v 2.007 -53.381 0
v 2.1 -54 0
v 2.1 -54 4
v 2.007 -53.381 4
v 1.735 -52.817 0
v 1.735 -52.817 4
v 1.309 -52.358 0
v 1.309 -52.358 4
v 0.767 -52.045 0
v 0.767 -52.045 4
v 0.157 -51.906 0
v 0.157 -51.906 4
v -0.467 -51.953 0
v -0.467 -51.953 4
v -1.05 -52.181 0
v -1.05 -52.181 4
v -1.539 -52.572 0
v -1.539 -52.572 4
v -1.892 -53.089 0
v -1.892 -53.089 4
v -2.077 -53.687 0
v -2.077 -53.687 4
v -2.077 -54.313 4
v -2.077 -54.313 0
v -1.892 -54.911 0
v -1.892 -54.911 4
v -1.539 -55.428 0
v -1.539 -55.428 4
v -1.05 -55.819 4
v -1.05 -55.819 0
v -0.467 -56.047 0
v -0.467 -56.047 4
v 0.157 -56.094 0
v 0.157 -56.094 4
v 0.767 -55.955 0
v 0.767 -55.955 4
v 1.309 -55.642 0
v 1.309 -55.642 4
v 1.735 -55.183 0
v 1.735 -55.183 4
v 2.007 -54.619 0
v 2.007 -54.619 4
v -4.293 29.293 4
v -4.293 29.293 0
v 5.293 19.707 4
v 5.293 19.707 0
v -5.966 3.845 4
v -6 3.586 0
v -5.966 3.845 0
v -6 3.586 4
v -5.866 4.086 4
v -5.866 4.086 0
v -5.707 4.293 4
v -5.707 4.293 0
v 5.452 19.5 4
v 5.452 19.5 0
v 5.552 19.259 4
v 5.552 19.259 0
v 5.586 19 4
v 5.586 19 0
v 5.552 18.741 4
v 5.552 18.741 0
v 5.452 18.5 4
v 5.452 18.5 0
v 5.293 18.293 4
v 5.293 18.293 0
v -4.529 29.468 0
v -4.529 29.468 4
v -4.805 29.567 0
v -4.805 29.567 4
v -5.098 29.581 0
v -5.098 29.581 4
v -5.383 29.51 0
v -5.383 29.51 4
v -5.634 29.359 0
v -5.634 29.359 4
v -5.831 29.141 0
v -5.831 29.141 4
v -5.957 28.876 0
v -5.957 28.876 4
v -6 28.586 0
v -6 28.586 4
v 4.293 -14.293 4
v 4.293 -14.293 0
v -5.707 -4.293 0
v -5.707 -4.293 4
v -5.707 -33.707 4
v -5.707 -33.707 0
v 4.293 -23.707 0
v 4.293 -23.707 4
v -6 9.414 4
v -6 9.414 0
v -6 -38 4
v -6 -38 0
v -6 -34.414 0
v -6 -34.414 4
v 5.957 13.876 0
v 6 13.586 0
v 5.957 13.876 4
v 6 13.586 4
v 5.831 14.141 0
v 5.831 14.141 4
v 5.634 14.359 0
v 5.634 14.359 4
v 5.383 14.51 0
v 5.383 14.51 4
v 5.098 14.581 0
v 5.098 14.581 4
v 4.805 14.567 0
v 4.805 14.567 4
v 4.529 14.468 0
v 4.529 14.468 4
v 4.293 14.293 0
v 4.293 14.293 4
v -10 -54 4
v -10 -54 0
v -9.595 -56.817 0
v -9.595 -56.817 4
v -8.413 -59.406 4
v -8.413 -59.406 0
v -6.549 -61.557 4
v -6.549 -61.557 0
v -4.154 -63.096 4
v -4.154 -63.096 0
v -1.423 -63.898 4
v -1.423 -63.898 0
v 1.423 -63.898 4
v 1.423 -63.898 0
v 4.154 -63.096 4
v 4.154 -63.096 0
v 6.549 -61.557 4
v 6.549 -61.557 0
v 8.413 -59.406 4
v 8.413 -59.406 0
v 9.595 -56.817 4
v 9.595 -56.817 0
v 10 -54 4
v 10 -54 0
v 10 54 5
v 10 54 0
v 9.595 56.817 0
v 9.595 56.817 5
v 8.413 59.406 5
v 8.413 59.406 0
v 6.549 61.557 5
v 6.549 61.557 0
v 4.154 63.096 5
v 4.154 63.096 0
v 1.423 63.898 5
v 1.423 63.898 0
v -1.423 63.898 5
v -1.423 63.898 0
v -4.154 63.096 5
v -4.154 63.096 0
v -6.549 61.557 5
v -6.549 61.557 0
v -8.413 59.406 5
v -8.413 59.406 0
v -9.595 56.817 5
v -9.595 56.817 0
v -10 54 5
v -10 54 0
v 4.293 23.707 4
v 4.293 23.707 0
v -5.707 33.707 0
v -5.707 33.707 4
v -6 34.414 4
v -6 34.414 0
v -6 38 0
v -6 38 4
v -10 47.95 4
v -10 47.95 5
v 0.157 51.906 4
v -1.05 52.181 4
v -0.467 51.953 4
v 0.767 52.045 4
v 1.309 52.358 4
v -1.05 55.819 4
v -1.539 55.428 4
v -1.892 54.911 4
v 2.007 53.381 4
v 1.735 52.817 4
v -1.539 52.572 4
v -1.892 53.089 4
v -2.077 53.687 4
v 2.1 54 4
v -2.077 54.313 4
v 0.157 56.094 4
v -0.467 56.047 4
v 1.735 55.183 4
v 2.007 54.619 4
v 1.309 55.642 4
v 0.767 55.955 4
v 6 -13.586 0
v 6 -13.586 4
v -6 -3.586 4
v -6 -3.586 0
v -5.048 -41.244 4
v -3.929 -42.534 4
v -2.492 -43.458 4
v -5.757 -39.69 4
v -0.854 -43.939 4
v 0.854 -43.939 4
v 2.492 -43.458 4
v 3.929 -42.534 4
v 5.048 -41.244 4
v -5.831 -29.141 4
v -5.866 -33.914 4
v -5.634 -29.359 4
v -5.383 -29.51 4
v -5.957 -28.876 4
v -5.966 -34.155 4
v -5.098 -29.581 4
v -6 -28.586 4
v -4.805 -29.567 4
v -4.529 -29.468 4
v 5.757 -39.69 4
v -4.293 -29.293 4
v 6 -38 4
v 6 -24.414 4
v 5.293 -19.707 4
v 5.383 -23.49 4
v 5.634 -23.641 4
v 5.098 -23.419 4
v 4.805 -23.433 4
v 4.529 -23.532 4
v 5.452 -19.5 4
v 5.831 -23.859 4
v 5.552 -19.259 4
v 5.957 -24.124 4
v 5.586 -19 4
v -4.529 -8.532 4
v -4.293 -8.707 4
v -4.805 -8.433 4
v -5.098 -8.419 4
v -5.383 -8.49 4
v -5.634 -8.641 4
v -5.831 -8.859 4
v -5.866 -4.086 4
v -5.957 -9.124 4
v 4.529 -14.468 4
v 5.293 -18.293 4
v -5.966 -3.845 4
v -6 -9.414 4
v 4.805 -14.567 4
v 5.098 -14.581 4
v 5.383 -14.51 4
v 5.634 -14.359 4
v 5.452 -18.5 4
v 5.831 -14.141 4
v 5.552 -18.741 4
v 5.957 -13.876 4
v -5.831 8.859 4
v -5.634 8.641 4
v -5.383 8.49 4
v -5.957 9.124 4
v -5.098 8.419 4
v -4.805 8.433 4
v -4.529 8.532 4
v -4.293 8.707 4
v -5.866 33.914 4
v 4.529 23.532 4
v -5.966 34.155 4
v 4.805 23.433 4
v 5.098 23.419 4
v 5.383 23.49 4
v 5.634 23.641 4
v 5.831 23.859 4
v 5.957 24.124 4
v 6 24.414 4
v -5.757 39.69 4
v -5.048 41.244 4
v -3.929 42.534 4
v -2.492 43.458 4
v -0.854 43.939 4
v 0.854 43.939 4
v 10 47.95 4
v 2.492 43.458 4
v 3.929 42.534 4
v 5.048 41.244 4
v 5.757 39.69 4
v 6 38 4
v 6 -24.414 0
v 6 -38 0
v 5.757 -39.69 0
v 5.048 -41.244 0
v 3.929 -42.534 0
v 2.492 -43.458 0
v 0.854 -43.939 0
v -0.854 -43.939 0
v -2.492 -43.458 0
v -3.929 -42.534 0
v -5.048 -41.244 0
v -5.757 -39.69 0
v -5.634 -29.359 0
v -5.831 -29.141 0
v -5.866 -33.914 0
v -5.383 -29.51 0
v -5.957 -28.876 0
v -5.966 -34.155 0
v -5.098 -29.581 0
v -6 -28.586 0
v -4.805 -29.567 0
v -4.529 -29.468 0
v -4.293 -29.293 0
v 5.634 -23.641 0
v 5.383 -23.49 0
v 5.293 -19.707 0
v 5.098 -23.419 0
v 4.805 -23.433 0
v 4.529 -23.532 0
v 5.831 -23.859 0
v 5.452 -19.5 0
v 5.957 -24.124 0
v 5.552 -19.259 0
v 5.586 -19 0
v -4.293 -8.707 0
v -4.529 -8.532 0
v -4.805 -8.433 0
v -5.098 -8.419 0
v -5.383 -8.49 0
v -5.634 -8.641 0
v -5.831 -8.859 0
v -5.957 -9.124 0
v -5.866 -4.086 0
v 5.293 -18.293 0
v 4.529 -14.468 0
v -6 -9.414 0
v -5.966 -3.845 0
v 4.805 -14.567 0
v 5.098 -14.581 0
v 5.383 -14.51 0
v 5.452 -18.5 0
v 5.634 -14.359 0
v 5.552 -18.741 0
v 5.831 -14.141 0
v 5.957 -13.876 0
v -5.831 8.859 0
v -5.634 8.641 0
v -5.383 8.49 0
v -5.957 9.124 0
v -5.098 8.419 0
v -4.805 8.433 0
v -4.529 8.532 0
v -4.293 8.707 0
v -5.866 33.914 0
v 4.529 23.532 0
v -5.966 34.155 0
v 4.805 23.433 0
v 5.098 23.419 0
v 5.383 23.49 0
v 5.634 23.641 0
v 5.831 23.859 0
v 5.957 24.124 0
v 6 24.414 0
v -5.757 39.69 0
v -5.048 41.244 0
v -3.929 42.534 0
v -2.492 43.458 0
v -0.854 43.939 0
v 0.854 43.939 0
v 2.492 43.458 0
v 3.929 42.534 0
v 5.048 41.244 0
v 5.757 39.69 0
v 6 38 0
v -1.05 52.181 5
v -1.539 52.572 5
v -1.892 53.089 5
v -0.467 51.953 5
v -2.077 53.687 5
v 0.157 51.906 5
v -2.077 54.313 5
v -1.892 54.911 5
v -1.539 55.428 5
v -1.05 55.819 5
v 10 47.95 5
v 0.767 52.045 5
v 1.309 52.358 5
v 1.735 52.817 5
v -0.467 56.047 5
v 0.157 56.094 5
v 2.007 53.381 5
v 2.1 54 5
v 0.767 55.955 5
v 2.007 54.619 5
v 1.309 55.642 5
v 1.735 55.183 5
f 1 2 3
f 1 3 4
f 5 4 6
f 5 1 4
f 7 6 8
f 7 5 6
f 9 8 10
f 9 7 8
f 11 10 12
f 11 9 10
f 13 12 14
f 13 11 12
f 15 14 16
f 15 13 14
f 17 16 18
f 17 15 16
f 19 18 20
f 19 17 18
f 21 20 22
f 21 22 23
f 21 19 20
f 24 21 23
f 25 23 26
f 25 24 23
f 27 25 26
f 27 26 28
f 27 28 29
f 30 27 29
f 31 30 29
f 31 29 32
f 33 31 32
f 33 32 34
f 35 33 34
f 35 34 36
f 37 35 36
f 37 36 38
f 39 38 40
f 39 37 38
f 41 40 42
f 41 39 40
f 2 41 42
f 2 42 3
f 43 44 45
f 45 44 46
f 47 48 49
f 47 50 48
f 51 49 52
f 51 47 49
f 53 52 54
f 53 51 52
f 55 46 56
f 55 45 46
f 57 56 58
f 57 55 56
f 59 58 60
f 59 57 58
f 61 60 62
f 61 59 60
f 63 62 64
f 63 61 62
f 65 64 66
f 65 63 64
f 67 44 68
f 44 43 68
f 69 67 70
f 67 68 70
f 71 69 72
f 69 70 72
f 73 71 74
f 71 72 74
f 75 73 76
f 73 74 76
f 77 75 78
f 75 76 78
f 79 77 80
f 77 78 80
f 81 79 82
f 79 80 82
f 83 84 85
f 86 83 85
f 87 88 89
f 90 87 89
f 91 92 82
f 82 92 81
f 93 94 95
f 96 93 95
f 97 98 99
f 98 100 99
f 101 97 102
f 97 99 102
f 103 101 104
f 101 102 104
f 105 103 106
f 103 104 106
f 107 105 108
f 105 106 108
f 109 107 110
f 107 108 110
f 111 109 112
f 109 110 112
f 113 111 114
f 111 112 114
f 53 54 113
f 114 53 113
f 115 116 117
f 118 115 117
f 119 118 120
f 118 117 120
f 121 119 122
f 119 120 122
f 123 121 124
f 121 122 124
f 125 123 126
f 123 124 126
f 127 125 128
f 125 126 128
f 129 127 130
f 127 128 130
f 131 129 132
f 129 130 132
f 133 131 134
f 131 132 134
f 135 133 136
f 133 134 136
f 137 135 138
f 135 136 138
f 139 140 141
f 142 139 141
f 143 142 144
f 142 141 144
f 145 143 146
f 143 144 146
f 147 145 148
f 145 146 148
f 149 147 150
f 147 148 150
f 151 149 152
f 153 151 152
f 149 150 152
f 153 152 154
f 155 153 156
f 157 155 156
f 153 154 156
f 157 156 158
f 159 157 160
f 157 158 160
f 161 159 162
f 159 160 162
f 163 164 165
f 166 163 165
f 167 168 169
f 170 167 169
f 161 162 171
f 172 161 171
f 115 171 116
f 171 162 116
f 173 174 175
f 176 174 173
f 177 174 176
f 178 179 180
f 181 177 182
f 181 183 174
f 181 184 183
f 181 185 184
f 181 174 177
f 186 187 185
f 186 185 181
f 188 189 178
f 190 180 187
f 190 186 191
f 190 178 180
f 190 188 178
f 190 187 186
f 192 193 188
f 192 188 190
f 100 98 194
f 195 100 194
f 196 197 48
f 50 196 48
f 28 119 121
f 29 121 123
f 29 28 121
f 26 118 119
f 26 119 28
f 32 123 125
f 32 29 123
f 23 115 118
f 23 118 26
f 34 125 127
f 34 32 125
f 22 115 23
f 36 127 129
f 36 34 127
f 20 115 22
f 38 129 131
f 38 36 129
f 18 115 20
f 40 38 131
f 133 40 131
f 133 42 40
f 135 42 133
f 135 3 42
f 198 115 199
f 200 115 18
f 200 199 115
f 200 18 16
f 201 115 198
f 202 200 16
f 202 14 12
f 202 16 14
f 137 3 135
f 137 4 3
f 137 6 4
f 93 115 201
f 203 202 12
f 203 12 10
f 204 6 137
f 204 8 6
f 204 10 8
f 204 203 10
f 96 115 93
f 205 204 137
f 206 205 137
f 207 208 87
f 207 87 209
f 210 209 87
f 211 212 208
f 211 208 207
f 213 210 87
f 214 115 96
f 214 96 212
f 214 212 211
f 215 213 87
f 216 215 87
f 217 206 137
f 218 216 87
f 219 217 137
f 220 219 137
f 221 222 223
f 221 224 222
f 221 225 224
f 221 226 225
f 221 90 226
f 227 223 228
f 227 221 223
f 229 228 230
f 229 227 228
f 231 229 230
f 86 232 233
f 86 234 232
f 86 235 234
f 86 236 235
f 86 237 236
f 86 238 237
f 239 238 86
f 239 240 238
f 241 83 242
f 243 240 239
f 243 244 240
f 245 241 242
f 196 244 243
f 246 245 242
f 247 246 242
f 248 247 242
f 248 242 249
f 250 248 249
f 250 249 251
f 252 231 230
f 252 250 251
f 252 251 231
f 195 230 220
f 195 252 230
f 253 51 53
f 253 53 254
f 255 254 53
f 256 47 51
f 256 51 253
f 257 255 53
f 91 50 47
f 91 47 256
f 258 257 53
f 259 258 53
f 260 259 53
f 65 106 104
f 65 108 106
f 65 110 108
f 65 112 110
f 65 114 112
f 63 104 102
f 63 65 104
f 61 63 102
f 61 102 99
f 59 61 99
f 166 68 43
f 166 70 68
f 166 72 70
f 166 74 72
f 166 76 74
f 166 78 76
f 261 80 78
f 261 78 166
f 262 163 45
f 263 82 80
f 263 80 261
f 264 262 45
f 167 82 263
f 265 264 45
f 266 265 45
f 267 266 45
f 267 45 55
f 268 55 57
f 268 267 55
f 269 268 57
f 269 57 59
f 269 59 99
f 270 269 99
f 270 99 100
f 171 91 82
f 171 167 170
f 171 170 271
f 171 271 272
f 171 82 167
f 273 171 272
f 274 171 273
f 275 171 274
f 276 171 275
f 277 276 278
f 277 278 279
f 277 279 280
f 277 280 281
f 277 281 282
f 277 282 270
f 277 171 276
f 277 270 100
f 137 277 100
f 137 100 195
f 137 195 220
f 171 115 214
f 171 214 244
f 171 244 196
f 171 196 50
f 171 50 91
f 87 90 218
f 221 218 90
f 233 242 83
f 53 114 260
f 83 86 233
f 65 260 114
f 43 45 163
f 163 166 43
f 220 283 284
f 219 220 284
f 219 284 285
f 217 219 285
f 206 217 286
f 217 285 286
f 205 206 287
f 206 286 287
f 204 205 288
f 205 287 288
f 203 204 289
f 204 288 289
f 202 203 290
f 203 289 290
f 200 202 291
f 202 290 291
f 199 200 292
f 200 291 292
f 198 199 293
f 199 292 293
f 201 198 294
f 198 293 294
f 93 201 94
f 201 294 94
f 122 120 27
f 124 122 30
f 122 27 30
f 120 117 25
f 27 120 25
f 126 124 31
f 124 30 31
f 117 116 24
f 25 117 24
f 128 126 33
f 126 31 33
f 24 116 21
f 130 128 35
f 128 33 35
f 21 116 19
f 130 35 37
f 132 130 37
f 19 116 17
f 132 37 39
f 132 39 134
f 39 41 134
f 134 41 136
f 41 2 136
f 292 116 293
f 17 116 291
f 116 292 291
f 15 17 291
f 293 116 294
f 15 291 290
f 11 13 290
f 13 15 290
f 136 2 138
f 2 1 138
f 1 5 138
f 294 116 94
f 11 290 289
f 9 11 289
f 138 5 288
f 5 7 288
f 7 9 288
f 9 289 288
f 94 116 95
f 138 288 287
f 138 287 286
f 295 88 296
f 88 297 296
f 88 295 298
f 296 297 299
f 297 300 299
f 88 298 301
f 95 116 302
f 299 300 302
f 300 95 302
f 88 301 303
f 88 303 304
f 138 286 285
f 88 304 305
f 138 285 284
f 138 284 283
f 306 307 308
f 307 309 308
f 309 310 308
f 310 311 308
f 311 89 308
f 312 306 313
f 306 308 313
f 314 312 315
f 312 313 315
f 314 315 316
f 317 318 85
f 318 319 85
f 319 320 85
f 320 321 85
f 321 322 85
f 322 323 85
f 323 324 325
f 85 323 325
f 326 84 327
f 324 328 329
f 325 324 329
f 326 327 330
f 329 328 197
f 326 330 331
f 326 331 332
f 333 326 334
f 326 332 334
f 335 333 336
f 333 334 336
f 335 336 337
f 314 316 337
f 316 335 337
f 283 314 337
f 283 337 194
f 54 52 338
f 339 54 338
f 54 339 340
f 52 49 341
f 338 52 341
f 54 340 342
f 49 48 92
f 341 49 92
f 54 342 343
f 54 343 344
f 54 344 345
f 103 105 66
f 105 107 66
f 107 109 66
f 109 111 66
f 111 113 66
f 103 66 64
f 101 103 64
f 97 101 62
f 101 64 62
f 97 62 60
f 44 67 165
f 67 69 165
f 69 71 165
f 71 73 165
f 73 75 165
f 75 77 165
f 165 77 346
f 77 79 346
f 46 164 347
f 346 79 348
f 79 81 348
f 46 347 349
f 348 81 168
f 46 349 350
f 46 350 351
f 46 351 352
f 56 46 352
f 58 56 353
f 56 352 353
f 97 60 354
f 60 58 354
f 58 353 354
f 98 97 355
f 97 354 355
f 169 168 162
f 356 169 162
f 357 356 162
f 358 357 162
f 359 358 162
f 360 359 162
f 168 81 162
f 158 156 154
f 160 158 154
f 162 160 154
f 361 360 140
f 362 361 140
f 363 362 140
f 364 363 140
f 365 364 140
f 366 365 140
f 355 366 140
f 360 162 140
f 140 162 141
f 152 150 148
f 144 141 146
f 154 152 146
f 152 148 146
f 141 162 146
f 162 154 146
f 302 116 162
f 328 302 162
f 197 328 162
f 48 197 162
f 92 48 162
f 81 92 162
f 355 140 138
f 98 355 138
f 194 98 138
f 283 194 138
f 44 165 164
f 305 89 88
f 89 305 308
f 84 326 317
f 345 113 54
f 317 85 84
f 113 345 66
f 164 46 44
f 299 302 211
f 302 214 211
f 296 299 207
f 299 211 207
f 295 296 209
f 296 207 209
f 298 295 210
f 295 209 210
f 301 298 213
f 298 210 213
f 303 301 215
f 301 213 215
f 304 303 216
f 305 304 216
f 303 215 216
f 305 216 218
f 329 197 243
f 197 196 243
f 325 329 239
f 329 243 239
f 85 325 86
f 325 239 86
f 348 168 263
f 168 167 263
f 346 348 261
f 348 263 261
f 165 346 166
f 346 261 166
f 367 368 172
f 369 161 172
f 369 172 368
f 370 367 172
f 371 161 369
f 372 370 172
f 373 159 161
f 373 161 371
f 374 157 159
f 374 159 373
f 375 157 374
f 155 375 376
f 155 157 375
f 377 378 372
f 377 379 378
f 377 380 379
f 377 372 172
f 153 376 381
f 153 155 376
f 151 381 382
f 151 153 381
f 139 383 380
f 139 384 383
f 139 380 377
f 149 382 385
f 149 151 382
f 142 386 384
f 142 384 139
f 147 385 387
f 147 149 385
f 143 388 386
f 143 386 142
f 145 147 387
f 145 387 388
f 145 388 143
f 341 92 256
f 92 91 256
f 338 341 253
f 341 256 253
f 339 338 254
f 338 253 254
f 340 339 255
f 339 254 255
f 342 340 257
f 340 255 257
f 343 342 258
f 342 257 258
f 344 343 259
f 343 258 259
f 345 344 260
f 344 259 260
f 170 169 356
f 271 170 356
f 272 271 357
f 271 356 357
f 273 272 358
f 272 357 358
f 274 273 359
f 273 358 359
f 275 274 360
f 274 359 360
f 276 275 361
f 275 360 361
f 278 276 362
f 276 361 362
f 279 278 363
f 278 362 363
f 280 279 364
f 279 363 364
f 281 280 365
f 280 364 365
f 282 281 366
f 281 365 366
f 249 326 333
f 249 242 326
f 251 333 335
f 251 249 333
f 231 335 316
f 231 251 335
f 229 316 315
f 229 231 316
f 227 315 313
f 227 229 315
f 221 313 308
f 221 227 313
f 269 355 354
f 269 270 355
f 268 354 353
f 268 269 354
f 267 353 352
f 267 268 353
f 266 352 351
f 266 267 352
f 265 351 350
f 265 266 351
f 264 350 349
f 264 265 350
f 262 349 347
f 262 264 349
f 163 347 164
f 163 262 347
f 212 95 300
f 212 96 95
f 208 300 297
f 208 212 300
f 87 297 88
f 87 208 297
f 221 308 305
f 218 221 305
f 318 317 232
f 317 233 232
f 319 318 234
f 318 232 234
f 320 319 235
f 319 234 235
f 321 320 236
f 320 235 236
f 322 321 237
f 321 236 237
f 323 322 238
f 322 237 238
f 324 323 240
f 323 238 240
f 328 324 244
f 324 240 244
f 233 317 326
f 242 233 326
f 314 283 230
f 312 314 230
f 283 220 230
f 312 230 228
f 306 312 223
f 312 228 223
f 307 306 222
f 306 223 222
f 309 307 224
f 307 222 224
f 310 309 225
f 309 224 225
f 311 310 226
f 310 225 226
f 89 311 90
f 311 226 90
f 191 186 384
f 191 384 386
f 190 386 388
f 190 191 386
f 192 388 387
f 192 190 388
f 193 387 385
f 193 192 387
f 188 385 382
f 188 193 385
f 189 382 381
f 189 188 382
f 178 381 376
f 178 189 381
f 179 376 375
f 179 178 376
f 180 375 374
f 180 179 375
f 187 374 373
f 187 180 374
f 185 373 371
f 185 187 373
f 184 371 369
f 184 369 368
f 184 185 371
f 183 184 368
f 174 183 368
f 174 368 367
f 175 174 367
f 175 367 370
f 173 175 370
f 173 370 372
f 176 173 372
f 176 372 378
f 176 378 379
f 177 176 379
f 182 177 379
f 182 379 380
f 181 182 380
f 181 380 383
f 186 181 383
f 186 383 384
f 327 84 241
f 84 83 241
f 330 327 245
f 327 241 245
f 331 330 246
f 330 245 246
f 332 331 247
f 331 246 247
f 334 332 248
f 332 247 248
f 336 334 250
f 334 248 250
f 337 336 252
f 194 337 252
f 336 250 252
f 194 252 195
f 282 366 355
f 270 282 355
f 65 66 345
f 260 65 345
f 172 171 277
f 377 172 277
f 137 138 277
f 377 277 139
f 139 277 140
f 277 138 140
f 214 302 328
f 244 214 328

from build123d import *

# Parameters (mm, degrees)
CROQUIS1_R              = 2.1
SALIENTE_EXTRUIR1_DEPTH = 4
CROQUIS1_6_R            = 2.1
SALIENTE_EXTRUIR3_DEPTH = 5
REDONDEO1_R             = 1


with BuildPart() as part:
    # Croquis1 → Saliente-Extruir1 (new body)
    with BuildSketch(Plane.XY):
        with BuildLine():
            ThreePointArc((10, 54), (0, 64), (-10, 54))
            Line((-10, 54), (-10, -54))
            ThreePointArc((-10, -54), (0, -64), (10, -54))
            Line((10, -54), (10, 54))
        make_face()
        with BuildLine():
            Line((6, 38), (6, 22))
            Line((6, 22), (-6, 34))
            Line((-6, 34), (-6, 38))
            ThreePointArc((-6, 38), (0, 44), (6, 38))
        make_face(mode=Mode.SUBTRACT)
        Polygon((-6, 7), (-6, 31), (6, 19), align=None, mode=Mode.SUBTRACT)
        Polygon((-6, -4), (-6, 4), (6, 16), (6, -16), align=None, mode=Mode.SUBTRACT)
        Polygon((-6, -31), (-6, -7), (6, -19), align=None, mode=Mode.SUBTRACT)
        with BuildLine():
            Line((-6, -38), (-6, -34))
            Line((-6, -34), (6, -22))
            Line((6, -22), (6, -38))
            ThreePointArc((6, -38), (0, -44), (-6, -38))
        make_face(mode=Mode.SUBTRACT)
        with Locations((0, -54)):
            Circle(CROQUIS1_R, mode=Mode.SUBTRACT)
    extrude(amount=SALIENTE_EXTRUIR1_DEPTH)

    # Croquis1<6> → Saliente-Extruir3 (add)
    with BuildSketch(Plane.XY):
        with BuildLine():
            Line((10, 47.95), (10, 54))
            ThreePointArc((10, 54), (0, 64), (-10, 54))
            Line((-10, 54), (-10, 47.95))
            Line((-10, 47.95), (10, 47.95))
        make_face()
        with Locations((0, 54)):
            Circle(CROQUIS1_6_R, mode=Mode.SUBTRACT)
    extrude(amount=SALIENTE_EXTRUIR3_DEPTH)

    # Redondeo1
    redondeo1_edges = [part.edges().sort_by_distance(p)[0] for p in [
        (6, 22, 2),
        (6, 16, 2),
        (6, 19, 2),
        (-6, 31, 2),
        (-6, 7, 2),
        (6, -22, 2),
        (6, -16, 2),
        (6, -19, 2),
        (-6, -31, 2),
        (-6, -7, 2),
        (-6, 34, 2),
        (-6, -4, 2),
        (-6, -34, 2),
        (-6, 4, 2),
    ]]
    fillet(redondeo1_edges, radius=REDONDEO1_R)


solid = part.part
